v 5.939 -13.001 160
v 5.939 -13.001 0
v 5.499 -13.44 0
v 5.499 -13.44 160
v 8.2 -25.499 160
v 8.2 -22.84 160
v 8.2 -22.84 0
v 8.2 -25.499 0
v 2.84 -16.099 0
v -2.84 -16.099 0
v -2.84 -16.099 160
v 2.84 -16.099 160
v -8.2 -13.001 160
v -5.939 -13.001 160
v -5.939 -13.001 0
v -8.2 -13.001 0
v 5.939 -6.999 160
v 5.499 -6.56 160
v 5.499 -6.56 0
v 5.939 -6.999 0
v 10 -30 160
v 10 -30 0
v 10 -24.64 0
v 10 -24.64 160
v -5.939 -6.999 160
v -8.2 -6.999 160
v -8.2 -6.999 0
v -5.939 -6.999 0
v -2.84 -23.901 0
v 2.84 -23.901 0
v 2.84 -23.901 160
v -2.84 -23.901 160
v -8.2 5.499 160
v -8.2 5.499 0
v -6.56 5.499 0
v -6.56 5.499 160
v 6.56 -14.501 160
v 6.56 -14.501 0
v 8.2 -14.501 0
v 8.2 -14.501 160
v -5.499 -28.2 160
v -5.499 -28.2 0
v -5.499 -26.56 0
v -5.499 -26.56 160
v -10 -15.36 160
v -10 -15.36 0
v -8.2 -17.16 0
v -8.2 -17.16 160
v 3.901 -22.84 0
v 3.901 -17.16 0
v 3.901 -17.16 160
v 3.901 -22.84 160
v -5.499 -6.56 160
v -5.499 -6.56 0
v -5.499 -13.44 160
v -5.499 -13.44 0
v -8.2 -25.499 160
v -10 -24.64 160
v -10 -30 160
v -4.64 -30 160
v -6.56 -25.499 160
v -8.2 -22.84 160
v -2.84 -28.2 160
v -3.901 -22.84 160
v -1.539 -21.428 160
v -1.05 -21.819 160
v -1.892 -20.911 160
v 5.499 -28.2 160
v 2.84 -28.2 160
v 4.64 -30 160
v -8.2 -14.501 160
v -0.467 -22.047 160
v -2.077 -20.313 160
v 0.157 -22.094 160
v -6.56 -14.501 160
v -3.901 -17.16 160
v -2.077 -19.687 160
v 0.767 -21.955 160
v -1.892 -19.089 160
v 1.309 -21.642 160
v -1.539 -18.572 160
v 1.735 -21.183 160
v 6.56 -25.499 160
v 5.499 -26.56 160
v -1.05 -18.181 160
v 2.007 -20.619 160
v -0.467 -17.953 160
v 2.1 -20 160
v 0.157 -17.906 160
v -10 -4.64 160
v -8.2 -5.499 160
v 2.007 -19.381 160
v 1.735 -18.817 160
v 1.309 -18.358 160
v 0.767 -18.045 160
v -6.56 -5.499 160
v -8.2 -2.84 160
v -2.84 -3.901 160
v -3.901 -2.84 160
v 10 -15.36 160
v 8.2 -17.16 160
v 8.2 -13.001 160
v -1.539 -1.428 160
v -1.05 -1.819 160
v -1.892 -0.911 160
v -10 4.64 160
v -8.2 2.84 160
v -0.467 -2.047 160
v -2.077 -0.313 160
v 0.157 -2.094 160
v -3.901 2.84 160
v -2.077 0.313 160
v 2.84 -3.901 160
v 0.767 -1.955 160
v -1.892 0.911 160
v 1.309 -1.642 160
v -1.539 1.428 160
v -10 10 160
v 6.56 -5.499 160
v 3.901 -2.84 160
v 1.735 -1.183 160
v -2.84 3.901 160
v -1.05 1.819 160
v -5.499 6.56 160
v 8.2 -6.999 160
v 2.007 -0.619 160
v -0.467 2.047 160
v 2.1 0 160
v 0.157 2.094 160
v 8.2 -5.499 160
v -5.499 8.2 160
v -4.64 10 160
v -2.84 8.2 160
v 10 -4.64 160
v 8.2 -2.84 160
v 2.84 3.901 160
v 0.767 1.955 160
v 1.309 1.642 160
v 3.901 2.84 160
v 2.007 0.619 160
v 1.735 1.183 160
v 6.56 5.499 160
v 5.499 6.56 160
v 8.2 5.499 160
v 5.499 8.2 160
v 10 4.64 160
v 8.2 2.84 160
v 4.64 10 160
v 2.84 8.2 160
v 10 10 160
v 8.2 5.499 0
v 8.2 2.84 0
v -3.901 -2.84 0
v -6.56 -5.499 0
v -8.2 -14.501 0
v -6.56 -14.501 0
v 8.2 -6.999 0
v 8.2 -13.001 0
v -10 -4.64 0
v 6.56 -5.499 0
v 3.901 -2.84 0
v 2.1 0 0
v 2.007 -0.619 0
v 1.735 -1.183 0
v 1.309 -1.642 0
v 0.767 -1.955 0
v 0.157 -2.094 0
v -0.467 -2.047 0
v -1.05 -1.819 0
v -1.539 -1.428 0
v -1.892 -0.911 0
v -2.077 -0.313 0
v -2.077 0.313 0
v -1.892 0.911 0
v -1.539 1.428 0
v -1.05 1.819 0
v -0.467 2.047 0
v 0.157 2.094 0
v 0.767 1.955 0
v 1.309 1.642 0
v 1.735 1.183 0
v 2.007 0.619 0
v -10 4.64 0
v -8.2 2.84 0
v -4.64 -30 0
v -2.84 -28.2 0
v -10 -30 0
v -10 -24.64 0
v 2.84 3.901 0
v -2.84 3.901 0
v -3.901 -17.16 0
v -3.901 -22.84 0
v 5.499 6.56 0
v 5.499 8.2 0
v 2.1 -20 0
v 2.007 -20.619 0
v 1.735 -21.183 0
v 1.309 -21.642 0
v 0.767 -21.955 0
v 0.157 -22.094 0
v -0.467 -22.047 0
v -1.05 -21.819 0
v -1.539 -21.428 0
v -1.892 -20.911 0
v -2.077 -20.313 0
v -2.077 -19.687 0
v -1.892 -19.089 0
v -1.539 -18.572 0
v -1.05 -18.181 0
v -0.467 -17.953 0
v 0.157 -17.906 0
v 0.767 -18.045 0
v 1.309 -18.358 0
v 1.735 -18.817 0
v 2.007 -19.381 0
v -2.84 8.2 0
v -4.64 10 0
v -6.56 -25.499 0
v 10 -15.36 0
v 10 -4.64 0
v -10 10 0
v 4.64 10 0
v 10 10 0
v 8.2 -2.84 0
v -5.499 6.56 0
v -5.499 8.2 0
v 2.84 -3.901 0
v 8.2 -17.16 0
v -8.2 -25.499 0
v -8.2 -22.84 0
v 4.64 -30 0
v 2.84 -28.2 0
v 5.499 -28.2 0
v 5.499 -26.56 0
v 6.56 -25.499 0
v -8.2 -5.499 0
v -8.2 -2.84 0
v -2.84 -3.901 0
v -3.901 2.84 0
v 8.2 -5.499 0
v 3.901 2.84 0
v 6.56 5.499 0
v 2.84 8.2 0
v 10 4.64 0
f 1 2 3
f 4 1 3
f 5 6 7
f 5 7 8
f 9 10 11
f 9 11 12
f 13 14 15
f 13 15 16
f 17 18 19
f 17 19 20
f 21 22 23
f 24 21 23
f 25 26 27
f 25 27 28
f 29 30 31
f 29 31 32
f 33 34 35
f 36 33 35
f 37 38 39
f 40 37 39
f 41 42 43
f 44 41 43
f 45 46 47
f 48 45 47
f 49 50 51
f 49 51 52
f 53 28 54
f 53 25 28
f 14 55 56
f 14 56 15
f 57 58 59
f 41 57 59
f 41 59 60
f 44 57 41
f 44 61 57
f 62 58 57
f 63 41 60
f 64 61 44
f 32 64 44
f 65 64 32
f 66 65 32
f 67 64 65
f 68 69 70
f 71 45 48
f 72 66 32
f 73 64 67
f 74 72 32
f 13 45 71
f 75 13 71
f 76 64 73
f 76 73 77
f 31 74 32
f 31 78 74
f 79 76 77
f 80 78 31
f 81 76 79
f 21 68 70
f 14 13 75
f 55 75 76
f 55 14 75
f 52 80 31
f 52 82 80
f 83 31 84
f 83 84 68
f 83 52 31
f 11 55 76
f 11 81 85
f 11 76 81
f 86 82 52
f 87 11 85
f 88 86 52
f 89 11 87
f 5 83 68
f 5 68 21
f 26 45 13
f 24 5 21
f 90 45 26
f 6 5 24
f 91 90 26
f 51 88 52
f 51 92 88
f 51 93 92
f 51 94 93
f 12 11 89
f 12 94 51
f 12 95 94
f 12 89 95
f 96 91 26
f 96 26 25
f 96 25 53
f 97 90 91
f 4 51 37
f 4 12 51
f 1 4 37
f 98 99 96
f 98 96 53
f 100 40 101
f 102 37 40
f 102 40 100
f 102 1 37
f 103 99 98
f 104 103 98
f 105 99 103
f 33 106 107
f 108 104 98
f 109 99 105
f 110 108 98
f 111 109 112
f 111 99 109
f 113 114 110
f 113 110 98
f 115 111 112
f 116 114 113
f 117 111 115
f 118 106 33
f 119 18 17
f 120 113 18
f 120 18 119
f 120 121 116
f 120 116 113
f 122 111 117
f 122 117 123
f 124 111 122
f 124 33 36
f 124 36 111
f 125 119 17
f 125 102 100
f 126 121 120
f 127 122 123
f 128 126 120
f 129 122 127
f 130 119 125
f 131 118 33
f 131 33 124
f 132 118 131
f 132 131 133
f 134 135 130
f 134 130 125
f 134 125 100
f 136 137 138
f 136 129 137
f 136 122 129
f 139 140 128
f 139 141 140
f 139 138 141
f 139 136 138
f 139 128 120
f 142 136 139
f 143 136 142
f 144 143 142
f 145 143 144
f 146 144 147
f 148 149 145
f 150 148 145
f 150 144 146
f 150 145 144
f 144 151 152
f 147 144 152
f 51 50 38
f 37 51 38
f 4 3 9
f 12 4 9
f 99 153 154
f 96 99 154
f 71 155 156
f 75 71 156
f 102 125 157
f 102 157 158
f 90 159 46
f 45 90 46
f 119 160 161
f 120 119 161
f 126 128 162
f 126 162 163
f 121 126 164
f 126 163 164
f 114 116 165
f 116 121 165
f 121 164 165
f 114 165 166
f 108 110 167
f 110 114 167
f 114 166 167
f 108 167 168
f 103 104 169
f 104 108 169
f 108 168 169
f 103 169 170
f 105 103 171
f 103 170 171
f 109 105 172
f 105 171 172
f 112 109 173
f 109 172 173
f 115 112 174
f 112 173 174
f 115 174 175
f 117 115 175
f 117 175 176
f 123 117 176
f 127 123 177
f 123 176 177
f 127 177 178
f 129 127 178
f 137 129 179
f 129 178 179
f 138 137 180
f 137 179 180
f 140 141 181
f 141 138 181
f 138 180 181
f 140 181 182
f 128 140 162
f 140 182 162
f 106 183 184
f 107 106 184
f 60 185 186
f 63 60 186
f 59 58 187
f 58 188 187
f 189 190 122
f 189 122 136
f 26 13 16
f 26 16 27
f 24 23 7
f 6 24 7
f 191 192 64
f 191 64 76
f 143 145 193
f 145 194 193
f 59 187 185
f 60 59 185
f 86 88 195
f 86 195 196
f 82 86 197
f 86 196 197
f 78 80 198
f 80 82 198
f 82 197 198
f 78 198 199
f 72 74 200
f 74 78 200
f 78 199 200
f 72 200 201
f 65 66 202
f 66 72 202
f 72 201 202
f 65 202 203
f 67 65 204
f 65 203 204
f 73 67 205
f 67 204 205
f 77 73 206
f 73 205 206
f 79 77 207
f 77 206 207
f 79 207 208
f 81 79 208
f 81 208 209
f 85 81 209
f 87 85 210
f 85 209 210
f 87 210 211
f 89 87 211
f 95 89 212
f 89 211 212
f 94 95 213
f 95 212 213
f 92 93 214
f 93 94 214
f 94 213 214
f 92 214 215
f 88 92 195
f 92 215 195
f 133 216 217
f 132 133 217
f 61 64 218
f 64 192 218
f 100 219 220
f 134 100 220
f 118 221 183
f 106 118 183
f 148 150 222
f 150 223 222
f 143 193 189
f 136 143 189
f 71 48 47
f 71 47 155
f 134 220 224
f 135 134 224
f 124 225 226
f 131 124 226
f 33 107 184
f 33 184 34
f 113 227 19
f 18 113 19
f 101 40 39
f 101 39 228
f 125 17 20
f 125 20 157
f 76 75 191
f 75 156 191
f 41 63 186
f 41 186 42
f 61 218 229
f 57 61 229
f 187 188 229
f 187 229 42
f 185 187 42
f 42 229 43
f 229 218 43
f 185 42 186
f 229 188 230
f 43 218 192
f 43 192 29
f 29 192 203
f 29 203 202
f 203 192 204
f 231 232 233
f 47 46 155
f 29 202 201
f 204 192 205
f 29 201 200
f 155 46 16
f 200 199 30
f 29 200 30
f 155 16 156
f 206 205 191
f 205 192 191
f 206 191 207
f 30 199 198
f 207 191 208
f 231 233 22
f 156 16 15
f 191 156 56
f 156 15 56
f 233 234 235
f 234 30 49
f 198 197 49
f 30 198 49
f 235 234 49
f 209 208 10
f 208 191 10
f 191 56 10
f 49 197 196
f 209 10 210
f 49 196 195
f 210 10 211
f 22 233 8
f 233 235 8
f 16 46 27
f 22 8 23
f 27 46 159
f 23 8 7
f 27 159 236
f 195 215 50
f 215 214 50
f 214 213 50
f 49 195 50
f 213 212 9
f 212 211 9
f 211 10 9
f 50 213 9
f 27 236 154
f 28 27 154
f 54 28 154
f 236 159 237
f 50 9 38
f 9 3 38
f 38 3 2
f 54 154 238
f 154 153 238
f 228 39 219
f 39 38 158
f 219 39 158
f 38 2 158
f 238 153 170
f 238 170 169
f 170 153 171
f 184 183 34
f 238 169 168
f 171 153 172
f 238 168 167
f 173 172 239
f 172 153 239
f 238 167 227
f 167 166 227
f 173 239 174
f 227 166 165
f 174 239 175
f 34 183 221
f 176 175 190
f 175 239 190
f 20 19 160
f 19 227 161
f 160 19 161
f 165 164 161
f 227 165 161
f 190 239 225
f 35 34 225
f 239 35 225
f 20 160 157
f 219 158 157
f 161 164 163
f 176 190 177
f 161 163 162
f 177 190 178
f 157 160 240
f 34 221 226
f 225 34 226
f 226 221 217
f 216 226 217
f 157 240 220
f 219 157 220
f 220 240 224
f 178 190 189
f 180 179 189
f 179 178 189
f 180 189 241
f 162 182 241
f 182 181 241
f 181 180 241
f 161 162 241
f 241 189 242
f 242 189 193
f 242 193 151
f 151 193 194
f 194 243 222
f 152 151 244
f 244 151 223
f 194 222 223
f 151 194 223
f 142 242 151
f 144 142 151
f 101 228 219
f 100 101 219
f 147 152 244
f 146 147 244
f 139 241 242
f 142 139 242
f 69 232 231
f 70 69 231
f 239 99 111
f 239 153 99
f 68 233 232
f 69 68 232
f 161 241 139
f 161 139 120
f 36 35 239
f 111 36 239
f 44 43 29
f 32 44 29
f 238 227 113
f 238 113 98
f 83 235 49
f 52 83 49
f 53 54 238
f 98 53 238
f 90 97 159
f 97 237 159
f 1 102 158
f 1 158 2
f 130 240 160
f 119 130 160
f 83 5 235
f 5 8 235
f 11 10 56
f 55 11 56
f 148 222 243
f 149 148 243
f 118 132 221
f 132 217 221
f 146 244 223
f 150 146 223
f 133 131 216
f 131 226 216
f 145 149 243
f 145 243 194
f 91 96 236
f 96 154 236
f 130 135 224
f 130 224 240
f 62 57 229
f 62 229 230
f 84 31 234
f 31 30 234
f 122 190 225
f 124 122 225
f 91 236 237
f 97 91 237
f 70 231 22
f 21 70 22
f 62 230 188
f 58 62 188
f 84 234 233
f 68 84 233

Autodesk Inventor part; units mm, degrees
ref_plane "YZ Plane" through (0, 0, 0) normal (1, 0, 0) x (0, 1, 0)
ref_plane "XY Plane" through (0, 0, 0) normal (0, 0, 1) x (1, 0, 0)
sketch "Sketch1" plane through (0, 0, 0) normal (0, 0, 1) x (1, 0, 0)
  line L0 (-3.9007, 3.9007) -> (3.9007, 3.9007)
  line L1 (3.9007, 3.9007) -> (3.9007, -3.9007)
  line L2 (3.9007, -3.9007) -> (-3.9007, -3.9007)
  line L3 (-3.9007, -3.9007) -> (-3.9007, 3.9007)
  line L4 (0, 3.9007) -> (0, -3.9007) construction
  line L5 (-3.9007, 0) -> (3.9007, 0) construction
  circle A0 centre (0, 0) radius 2.1
  line L6 (0, 0) -> (-16.1173, 16.1173) construction
  line L7 (0, 0) -> (22.7933, 0) construction
  line L8 (-2.84, 3.9007) -> (-5.4993, 6.56)
  line L9 (-5.4993, 6.56) -> (-5.4993, 8.2)
  line L10 (-5.4993, 8.2) -> (-2.84, 8.2)
  line L11 (-2.84, 8.2) -> (-4.64, 10)
  line L12 (-4.64, 10) -> (-10, 10)
  line L13 (-10, 10) -> (-10, 4.64)
  line L14 (-10, 4.64) -> (-8.2, 2.84)
  line L15 (-8.2, 2.84) -> (-8.2, 5.4993)
  line L16 (-8.2, 5.4993) -> (-6.56, 5.4993)
  line L17 (-6.56, 5.4993) -> (-3.9007, 2.84)
  line L18 (-3.9007, 2.84) -> (-11.3102, 2.84) construction
  line L19 (-2.84, 3.9007) -> (-3.9007, 3.9007)
  line L20 (-3.9007, 2.84) -> (-3.9007, 3.9007)
  line L21 (-3.9007, -2.84) -> (-6.56, -5.4993)
  line L22 (-6.56, -5.4993) -> (-8.2, -5.4993)
  line L23 (-8.2, -5.4993) -> (-8.2, -2.84)
  line L24 (-8.2, -2.84) -> (-10, -4.64)
  line L25 (-10, -4.64) -> (-10, -10)
  line L26 (-10, -10) -> (-4.64, -10)
  line L27 (-4.64, -10) -> (-2.84, -8.2)
  line L28 (-2.84, -8.2) -> (-5.4993, -8.2)
  line L29 (-5.4993, -8.2) -> (-5.4993, -6.56)
  line L30 (-5.4993, -6.56) -> (-2.84, -3.9007)
  line L31 (-3.9007, -2.84) -> (-3.9007, -3.9007)
  line L32 (-2.84, -3.9007) -> (-3.9007, -3.9007)
  line L33 (2.84, -3.9007) -> (5.4993, -6.56)
  line L34 (5.4993, -6.56) -> (5.4993, -8.2)
  line L35 (5.4993, -8.2) -> (2.84, -8.2)
  line L36 (2.84, -8.2) -> (4.64, -10)
  line L37 (4.64, -10) -> (10, -10)
  line L38 (10, -10) -> (10, -4.64)
  line L39 (10, -4.64) -> (8.2, -2.84)
  line L40 (8.2, -2.84) -> (8.2, -5.4993)
  line L41 (8.2, -5.4993) -> (6.56, -5.4993)
  line L42 (6.56, -5.4993) -> (3.9007, -2.84)
  line L43 (2.84, -3.9007) -> (3.9007, -3.9007)
  line L44 (3.9007, -2.84) -> (3.9007, -3.9007)
  line L45 (3.9007, 2.84) -> (6.56, 5.4993)
  line L46 (6.56, 5.4993) -> (8.2, 5.4993)
  line L47 (8.2, 5.4993) -> (8.2, 2.84)
  line L48 (8.2, 2.84) -> (10, 4.64)
  line L49 (10, 4.64) -> (10, 10)
  line L50 (10, 10) -> (4.64, 10)
  line L51 (4.64, 10) -> (2.84, 8.2)
  line L52 (2.84, 8.2) -> (5.4993, 8.2)
  line L53 (5.4993, 8.2) -> (5.4993, 6.56)
  line L54 (5.4993, 6.56) -> (2.84, 3.9007)
  line L55 (3.9007, 2.84) -> (3.9007, 3.9007)
  line L56 (2.84, 3.9007) -> (3.9007, 3.9007)
  dimension "d7" = 4.2
  dimension "d8" = 135
  dimension "d9" = 1.5
  dimension "d10" = 1.64
  dimension "d11" = 1.8
  dimension "d12" = 2.84
  dimension "d13" = 10
  dimension "d16" = 360
extrude "Extrusion1" add sketch "Sketch1" along normal blind 160
pattern_linear "Rectangular Pattern1" count 2 spacing 20 along (0, -1, 0) of "Extrusion1"
sketch "Sketch2" plane through (0, 0, 160) normal (0, 0, 1) x (1, 0, 0)
  line L0 (8.2, -2.84) -> (8.2, -5.4993) projected
  line L1 (8.2, -5.4993) -> (6.56, -5.4993) projected
  line L2 (-6.56, -5.4993) -> (-8.2, -5.4993) projected
  line L3 (-8.2, -5.4993) -> (-8.2, -2.84) projected
  line L4 (-8.2, -14.5007) -> (-6.56, -14.5007) projected
  line L5 (6.56, -14.5007) -> (8.2, -14.5007) projected
  line L6 (5.4993, -11.8) -> (5.4993, -13.44) projected
  line L7 (5.4993, -13.44) -> (2.84, -16.0993) projected
  line L8 (-2.84, -16.0993) -> (-5.4993, -13.44) projected
  line L9 (-5.4993, -8.2) -> (-5.4993, -6.56) projected
  line L10 (-5.4993, -6.56) -> (-2.84, -3.9007) projected
  line L11 (2.84, -3.9007) -> (5.4993, -6.56) projected
  line L12 (2.84, -8.2) -> (4.64, -10) projected
  line L13 (-8.2, -6.9993) -> (-5.9387, -6.9993)
  line L14 (-5.9387, -6.9993) -> (-4.1231, -5.1837)
  line L15 (-4.1231, -5.1837) -> (4.1231, -5.1837)
  line L16 (4.1231, -5.1837) -> (5.9387, -6.9993)
  line L17 (5.9387, -6.9993) -> (8.2, -6.9993)
  line L18 (8.2, -6.9993) -> (8.2, -13.0007)
  line L19 (8.2, -13.0007) -> (5.9387, -13.0007)
  line L20 (5.9387, -13.0007) -> (4.2461, -14.6932)
  line L21 (4.2461, -14.6932) -> (-4.2461, -14.6932)
  line L22 (-4.2461, -14.6932) -> (-5.9387, -13.0007)
  line L23 (-5.9387, -13.0007) -> (-8.2, -13.0007)
  line L24 (-8.2, -13.0007) -> (-8.2, -6.9993)
  dimension "d23" = 1.5
  dimension "d24" = 1.5
  dimension "d25" = 1.5
  dimension "d26" = 1.5
extrude "Extrusion2" cut sketch "Sketch2" against normal up to next
ref_plane "Work Plane3" through (0, -20, 0) normal (0, 1, 0) x (-1, 0, 0)
ref_plane "Work Plane2" through (0, 0, 0) normal (0, 1, 0) x (-1, 0, 0)
ref_plane "Work Plane1" through (0, -10, 0) normal (0, 1, 0) x (-1, 0, 0)
equation "\"d24\" = d23"
equation "\"d25\" = d23"
equation "\"d26\" = d23"
properties part number "20x40x597mm" material "Aluminum 6061"
